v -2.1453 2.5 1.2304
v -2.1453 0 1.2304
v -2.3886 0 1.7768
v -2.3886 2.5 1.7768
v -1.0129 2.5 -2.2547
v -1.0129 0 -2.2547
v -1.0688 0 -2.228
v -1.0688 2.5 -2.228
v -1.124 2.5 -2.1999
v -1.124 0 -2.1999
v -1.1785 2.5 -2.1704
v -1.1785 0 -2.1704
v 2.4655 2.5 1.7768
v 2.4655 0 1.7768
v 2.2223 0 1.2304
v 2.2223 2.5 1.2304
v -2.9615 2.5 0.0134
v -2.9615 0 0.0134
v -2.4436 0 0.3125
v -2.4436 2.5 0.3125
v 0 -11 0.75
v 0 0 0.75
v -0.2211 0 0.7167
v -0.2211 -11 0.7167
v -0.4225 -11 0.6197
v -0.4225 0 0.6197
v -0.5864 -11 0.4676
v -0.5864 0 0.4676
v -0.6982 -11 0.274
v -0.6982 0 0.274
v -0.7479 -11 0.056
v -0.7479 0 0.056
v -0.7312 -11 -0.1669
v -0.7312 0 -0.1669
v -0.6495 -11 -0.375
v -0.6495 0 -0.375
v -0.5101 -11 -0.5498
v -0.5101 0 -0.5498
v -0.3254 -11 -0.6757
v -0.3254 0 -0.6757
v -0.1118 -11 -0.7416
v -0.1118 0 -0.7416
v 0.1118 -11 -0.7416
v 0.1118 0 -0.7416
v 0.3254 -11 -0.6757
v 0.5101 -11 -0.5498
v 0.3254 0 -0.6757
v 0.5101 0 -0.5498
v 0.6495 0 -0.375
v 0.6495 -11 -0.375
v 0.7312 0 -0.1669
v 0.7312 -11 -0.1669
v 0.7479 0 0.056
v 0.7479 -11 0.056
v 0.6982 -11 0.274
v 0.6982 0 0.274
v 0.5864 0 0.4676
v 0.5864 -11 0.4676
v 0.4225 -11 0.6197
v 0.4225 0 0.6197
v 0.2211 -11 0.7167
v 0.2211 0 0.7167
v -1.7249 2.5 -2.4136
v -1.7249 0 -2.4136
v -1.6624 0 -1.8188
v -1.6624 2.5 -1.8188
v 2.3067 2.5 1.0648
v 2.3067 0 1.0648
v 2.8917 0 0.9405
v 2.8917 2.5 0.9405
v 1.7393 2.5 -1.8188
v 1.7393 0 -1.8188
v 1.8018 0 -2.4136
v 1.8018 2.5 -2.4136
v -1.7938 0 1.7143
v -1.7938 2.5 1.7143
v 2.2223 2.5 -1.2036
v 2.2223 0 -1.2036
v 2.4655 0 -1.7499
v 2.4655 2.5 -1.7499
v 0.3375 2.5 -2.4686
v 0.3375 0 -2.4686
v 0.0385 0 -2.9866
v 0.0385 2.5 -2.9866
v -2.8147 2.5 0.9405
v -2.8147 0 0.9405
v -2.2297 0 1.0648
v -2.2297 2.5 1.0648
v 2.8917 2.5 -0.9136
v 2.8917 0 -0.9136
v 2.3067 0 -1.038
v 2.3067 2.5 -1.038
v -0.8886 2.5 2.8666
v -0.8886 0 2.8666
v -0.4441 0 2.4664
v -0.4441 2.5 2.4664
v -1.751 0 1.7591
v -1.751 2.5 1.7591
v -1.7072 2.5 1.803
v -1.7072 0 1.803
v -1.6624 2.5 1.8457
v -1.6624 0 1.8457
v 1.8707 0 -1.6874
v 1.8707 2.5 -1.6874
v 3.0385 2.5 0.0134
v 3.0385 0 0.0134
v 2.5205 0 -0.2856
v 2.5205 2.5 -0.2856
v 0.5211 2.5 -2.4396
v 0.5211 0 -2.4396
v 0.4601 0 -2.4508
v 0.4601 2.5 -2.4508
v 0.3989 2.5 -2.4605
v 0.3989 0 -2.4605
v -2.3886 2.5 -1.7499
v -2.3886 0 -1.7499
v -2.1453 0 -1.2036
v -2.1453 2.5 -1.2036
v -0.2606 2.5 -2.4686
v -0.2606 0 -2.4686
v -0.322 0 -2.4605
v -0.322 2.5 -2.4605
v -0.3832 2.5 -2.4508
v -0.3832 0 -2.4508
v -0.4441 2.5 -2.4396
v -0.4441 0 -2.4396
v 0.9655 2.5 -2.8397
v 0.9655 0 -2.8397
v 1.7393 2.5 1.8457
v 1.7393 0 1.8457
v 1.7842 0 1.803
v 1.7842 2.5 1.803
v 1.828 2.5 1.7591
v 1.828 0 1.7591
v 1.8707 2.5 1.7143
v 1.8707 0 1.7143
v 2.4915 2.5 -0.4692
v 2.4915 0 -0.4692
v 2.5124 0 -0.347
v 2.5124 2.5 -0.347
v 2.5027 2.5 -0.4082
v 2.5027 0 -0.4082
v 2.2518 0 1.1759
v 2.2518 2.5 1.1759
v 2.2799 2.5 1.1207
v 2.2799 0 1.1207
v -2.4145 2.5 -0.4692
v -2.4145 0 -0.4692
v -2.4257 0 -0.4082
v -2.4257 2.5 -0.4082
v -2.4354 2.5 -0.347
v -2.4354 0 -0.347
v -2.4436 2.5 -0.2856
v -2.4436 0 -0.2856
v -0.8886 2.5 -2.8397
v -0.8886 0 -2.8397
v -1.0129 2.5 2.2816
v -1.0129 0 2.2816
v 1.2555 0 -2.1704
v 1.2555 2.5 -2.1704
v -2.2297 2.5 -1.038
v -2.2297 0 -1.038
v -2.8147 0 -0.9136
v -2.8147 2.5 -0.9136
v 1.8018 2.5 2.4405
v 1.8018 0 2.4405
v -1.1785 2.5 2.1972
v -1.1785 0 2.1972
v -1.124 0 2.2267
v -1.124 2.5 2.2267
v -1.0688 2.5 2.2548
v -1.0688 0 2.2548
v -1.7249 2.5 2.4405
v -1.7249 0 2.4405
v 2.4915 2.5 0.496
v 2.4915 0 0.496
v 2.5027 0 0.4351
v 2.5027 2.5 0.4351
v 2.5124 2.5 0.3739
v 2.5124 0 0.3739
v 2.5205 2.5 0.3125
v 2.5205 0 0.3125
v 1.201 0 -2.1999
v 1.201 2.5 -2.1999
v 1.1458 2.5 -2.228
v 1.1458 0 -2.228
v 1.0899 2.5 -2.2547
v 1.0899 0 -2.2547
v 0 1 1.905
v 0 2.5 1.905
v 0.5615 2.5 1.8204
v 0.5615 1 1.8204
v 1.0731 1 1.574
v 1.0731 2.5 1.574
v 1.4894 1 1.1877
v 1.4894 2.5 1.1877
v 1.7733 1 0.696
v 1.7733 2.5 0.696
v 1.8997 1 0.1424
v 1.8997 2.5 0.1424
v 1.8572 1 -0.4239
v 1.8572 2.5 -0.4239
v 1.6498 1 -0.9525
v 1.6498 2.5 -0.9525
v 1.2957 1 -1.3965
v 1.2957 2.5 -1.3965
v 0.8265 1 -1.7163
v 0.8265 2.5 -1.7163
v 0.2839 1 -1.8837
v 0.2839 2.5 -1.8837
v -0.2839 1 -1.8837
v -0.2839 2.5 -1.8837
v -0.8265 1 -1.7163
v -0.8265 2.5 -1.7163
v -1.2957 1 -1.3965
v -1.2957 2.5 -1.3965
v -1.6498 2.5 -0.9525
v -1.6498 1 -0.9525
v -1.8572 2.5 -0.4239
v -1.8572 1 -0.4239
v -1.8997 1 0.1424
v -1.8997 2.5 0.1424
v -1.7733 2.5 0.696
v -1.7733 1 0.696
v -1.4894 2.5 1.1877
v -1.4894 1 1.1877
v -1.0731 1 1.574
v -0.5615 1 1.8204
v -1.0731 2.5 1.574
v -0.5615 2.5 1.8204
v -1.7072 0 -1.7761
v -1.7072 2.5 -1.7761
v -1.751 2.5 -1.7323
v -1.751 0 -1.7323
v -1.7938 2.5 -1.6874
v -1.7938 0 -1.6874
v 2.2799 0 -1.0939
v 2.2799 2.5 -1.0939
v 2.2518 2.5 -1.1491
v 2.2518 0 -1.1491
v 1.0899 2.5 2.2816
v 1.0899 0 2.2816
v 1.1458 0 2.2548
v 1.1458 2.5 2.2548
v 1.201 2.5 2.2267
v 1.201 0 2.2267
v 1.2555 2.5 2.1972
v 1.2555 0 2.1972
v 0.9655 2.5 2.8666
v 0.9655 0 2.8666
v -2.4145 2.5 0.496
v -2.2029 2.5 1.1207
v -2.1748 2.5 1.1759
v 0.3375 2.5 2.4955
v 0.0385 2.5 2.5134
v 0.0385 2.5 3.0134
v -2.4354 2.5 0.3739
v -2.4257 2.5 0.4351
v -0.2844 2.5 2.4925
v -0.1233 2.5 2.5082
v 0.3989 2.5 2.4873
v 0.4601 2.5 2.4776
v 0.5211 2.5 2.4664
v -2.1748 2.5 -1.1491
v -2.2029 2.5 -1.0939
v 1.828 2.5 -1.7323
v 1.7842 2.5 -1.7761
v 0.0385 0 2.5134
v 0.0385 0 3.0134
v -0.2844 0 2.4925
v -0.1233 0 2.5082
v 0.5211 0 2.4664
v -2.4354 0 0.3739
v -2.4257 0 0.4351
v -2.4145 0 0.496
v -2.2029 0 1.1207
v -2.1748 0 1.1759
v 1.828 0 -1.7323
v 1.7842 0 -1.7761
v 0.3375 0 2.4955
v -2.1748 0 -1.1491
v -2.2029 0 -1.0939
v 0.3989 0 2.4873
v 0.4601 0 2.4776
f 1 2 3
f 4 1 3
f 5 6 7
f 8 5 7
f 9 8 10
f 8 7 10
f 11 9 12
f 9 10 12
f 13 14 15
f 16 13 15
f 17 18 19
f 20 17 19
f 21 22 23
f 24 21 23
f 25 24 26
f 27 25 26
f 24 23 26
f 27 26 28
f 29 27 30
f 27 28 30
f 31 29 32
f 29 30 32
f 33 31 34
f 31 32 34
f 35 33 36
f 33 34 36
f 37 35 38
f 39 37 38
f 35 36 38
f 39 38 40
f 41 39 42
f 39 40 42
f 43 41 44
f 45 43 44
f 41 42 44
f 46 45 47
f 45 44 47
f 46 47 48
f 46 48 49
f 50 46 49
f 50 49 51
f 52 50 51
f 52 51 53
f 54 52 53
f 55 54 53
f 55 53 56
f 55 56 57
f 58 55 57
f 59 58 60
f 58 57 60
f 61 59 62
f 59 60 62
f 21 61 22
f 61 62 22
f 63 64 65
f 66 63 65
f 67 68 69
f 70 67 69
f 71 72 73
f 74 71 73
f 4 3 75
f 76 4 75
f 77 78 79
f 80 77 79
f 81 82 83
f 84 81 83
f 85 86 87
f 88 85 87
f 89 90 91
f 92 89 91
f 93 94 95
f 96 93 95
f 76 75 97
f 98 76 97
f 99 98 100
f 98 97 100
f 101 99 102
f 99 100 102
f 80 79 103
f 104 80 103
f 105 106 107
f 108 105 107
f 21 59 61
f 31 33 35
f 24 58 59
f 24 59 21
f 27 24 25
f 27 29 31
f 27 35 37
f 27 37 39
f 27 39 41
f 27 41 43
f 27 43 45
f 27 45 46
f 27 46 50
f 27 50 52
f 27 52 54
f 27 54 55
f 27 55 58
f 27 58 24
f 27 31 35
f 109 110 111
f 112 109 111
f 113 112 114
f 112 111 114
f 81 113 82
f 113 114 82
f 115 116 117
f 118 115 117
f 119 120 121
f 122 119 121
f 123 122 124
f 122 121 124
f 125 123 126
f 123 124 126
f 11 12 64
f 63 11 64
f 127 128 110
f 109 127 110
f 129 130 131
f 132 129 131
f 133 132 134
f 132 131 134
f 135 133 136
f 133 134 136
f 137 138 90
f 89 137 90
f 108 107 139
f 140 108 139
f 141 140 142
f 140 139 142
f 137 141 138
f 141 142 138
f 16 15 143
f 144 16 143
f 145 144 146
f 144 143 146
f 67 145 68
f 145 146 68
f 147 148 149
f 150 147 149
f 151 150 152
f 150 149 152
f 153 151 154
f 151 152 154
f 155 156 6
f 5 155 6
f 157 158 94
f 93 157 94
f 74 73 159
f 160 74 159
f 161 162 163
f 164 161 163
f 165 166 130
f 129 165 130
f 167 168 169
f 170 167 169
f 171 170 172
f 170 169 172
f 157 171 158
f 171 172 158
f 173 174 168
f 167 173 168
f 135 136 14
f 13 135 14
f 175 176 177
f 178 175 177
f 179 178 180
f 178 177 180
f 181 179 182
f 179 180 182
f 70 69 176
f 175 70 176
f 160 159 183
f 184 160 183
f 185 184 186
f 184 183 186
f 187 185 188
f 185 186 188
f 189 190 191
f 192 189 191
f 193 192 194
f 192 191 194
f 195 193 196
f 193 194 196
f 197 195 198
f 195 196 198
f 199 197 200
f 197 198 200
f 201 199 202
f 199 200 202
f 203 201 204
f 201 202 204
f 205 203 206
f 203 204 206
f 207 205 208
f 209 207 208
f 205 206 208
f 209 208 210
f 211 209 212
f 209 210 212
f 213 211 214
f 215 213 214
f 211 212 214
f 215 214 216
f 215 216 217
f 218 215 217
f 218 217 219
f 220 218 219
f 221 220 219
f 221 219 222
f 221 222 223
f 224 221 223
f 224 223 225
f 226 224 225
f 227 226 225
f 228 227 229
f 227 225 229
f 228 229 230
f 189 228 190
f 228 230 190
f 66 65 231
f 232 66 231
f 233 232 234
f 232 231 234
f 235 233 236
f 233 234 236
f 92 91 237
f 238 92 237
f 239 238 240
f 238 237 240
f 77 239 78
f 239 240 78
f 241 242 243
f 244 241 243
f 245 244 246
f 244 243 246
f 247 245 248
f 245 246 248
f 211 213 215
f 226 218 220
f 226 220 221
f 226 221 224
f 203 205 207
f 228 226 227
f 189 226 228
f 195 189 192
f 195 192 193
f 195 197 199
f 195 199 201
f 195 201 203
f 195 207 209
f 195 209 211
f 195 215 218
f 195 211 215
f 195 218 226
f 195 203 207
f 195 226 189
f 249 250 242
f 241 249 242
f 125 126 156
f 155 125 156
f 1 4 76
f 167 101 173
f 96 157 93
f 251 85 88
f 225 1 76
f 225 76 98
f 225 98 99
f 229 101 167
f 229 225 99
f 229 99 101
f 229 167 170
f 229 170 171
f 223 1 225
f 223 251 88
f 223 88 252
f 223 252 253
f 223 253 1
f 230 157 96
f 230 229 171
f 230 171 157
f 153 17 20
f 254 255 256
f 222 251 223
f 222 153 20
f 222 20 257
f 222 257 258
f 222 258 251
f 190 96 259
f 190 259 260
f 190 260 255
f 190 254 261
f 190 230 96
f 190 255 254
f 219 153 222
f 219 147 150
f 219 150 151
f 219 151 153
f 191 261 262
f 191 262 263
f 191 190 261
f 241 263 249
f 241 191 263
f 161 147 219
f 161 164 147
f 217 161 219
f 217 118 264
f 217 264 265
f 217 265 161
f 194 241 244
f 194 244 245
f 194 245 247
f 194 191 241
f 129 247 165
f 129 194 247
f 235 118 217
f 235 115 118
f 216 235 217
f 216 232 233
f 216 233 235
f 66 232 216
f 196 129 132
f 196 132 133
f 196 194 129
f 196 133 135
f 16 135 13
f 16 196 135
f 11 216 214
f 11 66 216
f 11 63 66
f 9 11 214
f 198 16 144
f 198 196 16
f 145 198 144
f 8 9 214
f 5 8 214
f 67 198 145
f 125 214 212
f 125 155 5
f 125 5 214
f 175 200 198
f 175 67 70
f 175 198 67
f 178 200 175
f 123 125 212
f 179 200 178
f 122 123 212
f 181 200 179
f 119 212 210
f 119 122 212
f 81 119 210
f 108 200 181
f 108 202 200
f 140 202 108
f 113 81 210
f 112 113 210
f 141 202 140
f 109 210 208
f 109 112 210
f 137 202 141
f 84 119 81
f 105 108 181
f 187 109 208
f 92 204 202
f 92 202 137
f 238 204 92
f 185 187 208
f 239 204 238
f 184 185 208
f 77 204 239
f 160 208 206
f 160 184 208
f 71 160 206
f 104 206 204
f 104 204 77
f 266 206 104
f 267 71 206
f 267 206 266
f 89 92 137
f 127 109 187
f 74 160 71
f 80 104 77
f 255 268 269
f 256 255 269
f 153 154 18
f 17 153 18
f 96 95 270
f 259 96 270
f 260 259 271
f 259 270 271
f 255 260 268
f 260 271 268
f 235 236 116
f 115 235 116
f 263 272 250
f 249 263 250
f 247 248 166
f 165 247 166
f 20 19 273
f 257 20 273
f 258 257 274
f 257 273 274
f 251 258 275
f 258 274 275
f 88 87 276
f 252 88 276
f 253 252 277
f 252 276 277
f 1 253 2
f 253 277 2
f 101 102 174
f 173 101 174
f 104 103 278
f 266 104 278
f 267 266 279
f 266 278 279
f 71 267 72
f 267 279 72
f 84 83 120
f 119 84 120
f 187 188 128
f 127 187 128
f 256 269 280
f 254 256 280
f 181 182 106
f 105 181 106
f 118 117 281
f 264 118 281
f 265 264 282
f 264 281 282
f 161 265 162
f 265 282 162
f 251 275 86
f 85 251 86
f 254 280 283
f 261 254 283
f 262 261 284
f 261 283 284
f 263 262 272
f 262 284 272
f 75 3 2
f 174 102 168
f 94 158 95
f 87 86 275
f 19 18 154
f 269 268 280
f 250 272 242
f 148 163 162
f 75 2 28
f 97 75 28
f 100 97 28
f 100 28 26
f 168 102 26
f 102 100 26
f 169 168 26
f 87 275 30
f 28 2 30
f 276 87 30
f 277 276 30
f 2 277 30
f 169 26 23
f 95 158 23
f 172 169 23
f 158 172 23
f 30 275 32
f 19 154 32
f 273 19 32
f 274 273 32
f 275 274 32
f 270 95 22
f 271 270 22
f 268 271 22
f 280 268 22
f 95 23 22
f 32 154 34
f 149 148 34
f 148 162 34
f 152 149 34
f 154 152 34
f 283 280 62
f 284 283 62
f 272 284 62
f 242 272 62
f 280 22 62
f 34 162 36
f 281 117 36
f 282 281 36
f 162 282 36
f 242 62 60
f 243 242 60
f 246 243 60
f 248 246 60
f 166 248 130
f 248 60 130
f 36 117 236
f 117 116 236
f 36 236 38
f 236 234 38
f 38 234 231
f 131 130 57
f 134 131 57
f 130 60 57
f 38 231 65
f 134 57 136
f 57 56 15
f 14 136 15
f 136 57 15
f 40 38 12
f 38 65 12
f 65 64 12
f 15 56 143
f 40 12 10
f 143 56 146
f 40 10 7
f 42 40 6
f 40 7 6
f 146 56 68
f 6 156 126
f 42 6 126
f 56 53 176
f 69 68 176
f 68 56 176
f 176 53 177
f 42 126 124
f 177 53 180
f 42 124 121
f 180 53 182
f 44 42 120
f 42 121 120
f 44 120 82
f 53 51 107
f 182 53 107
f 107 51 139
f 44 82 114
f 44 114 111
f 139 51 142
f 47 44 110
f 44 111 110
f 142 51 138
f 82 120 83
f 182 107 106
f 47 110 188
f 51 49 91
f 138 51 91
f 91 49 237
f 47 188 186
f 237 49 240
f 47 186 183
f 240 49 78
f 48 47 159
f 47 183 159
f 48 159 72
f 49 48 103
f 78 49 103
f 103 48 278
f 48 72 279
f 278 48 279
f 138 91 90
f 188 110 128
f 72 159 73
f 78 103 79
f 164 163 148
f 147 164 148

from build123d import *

# Parameters (mm, degrees)
BOSS_EXTRUDE2_DEPTH = 2.5
SKETCH5_R           = 1.905
CUT_EXTRUDE1_DEPTH  = 1.5
SKETCH6_R           = 0.75
BOSS_EXTRUDE3_DEPTH = 11


# Read off the part's stored shape, not the designer's step: Boss-Extrude2
with BuildPart() as part:
    # Boss-Extrude2 outline → Boss-Extrude2 (new body)
    with BuildSketch(Plane(origin=(0, 0, 0), x_dir=(1, 0, 0), z_dir=(0, 1, 0))):
        with BuildLine():
            ThreePointArc((-0.444105945, -2.466402753), (-0.203951755, -2.501641146), (0.038487797, -2.513424302))
            Line((0.038487797, -2.513424302), (0.038487797, -3.013424302))
            Line((0.038487797, -3.013424302), (0.337525902, -2.495475109))
            ThreePointArc((0.337525902, -2.495475109), (0.429573959, -2.482645153), (0.521081538, -2.466402753))
            Line((0.521081538, -2.466402753), (0.96553878, -2.866593851))
            Line((0.96553878, -2.866593851), (1.089885816, -2.28158704))
            ThreePointArc((1.089885816, -2.28158704), (1.173464046, -2.240940612), (1.255473747, -2.197215774))
            Line((1.255473747, -2.197215774), (1.801843553, -2.440475285))
            Line((1.801843553, -2.440475285), (1.739327566, -1.845675398))
            ThreePointArc((1.739327566, -1.845675398), (1.80625475, -1.781191255), (1.870738892, -1.714264071))
            Line((1.870738892, -1.714264071), (2.46553878, -1.776780059))
            Line((2.46553878, -1.776780059), (2.222279269, -1.230410253))
            ThreePointArc((2.222279269, -1.230410253), (2.266004107, -1.148400551), (2.306650534, -1.064822321))
            Line((2.306650534, -1.064822321), (2.891657345, -0.940475285))
            Line((2.891657345, -0.940475285), (2.491466248, -0.496018043))
            ThreePointArc((2.491466248, -0.496018043), (2.507708648, -0.404510464), (2.520538604, -0.312462408))
            Line((2.520538604, -0.312462408), (3.038487797, -0.013424302))
            Line((3.038487797, -0.013424302), (2.520538604, 0.285613804))
            ThreePointArc((2.520538604, 0.285613804), (2.507708648, 0.377661861), (2.491466248, 0.46916944))
            Line((2.491466248, 0.46916944), (2.891657345, 0.913626681))
            Line((2.891657345, 0.913626681), (2.306650534, 1.037973718))
            ThreePointArc((2.306650534, 1.037973718), (2.266004107, 1.121551948), (2.222279269, 1.203561649))
            Line((2.222279269, 1.203561649), (2.46553878, 1.749931455))
            Line((2.46553878, 1.749931455), (1.870738892, 1.687415468))
            ThreePointArc((1.870738892, 1.687415468), (1.80625475, 1.754342652), (1.739327566, 1.818826794))
            Line((1.739327566, 1.818826794), (1.801843553, 2.413626681))
            Line((1.801843553, 2.413626681), (1.255473747, 2.170367171))
            ThreePointArc((1.255473747, 2.170367171), (1.173464046, 2.214092009), (1.089885816, 2.254738436))
            Line((1.089885816, 2.254738436), (0.96553878, 2.839745247))
            Line((0.96553878, 2.839745247), (0.521081538, 2.439554149))
            ThreePointArc((0.521081538, 2.439554149), (0.429573959, 2.45579655), (0.337525902, 2.468626506))
            Line((0.337525902, 2.468626506), (0.038487797, 2.986575698))
            Line((0.038487797, 2.986575698), (-0.260550309, 2.468626506))
            ThreePointArc((-0.260550309, 2.468626506), (-0.352598366, 2.45579655), (-0.444105945, 2.439554149))
            Line((-0.444105945, 2.439554149), (-0.888563187, 2.839745247))
            Line((-0.888563187, 2.839745247), (-1.012910223, 2.254738436))
            ThreePointArc((-1.012910223, 2.254738436), (-1.096488453, 2.214092009), (-1.178498154, 2.170367171))
            Line((-1.178498154, 2.170367171), (-1.72486796, 2.413626681))
            Line((-1.72486796, 2.413626681), (-1.662351973, 1.818826794))
            ThreePointArc((-1.662351973, 1.818826794), (-1.729279156, 1.754342651), (-1.793763299, 1.687415468))
            Line((-1.793763299, 1.687415468), (-2.388563187, 1.749931455))
            Line((-2.388563187, 1.749931455), (-2.145303676, 1.203561649))
            ThreePointArc((-2.145303676, 1.203561649), (-2.189028514, 1.121551948), (-2.229674941, 1.037973718))
            Line((-2.229674941, 1.037973718), (-2.814681752, 0.913626681))
            Line((-2.814681752, 0.913626681), (-2.414490654, 0.46916944))
            ThreePointArc((-2.414490654, 0.46916944), (-2.430733055, 0.377661861), (-2.443563011, 0.285613804))
            Line((-2.443563011, 0.285613804), (-2.961512203, -0.013424302))
            Line((-2.961512203, -0.013424302), (-2.443563011, -0.312462408))
            ThreePointArc((-2.443563011, -0.312462408), (-2.430733055, -0.404510465), (-2.414490654, -0.496018043))
            Line((-2.414490654, -0.496018043), (-2.814681752, -0.940475285))
            Line((-2.814681752, -0.940475285), (-2.229674941, -1.064822321))
            ThreePointArc((-2.229674941, -1.064822321), (-2.189028514, -1.148400551), (-2.145303676, -1.230410253))
            Line((-2.145303676, -1.230410253), (-2.388563187, -1.776780059))
            Line((-2.388563187, -1.776780059), (-1.793763299, -1.714264071))
            ThreePointArc((-1.793763299, -1.714264071), (-1.729279156, -1.781191255), (-1.662351973, -1.845675398))
            Line((-1.662351973, -1.845675398), (-1.72486796, -2.440475285))
            Line((-1.72486796, -2.440475285), (-1.178498154, -2.197215774))
            ThreePointArc((-1.178498154, -2.197215774), (-1.096488453, -2.240940612), (-1.012910223, -2.28158704))
            Line((-1.012910223, -2.28158704), (-0.888563187, -2.866593851))
            Line((-0.888563187, -2.866593851), (-0.444105945, -2.466402753))
        make_face()
    extrude(amount=BOSS_EXTRUDE2_DEPTH)

    # Sketch5 → Cut-Extrude1 (cut)
    with BuildSketch(Plane(origin=(0, 2.5, 0), x_dir=(1, 0, 0), z_dir=(0, 1, 0))):
        with Locations(Location((0, 0, 0), (0, 0, 270))):
            Circle(SKETCH5_R)
    extrude(amount=-CUT_EXTRUDE1_DEPTH, mode=Mode.SUBTRACT)

    # Sketch6 → Boss-Extrude3 (add)
    with BuildSketch(Plane.XZ):
        with Locations(Location((0, 0, 0), (0, 0, 90))):
            Circle(SKETCH6_R)
    extrude(amount=BOSS_EXTRUDE3_DEPTH)


solid = part.part
